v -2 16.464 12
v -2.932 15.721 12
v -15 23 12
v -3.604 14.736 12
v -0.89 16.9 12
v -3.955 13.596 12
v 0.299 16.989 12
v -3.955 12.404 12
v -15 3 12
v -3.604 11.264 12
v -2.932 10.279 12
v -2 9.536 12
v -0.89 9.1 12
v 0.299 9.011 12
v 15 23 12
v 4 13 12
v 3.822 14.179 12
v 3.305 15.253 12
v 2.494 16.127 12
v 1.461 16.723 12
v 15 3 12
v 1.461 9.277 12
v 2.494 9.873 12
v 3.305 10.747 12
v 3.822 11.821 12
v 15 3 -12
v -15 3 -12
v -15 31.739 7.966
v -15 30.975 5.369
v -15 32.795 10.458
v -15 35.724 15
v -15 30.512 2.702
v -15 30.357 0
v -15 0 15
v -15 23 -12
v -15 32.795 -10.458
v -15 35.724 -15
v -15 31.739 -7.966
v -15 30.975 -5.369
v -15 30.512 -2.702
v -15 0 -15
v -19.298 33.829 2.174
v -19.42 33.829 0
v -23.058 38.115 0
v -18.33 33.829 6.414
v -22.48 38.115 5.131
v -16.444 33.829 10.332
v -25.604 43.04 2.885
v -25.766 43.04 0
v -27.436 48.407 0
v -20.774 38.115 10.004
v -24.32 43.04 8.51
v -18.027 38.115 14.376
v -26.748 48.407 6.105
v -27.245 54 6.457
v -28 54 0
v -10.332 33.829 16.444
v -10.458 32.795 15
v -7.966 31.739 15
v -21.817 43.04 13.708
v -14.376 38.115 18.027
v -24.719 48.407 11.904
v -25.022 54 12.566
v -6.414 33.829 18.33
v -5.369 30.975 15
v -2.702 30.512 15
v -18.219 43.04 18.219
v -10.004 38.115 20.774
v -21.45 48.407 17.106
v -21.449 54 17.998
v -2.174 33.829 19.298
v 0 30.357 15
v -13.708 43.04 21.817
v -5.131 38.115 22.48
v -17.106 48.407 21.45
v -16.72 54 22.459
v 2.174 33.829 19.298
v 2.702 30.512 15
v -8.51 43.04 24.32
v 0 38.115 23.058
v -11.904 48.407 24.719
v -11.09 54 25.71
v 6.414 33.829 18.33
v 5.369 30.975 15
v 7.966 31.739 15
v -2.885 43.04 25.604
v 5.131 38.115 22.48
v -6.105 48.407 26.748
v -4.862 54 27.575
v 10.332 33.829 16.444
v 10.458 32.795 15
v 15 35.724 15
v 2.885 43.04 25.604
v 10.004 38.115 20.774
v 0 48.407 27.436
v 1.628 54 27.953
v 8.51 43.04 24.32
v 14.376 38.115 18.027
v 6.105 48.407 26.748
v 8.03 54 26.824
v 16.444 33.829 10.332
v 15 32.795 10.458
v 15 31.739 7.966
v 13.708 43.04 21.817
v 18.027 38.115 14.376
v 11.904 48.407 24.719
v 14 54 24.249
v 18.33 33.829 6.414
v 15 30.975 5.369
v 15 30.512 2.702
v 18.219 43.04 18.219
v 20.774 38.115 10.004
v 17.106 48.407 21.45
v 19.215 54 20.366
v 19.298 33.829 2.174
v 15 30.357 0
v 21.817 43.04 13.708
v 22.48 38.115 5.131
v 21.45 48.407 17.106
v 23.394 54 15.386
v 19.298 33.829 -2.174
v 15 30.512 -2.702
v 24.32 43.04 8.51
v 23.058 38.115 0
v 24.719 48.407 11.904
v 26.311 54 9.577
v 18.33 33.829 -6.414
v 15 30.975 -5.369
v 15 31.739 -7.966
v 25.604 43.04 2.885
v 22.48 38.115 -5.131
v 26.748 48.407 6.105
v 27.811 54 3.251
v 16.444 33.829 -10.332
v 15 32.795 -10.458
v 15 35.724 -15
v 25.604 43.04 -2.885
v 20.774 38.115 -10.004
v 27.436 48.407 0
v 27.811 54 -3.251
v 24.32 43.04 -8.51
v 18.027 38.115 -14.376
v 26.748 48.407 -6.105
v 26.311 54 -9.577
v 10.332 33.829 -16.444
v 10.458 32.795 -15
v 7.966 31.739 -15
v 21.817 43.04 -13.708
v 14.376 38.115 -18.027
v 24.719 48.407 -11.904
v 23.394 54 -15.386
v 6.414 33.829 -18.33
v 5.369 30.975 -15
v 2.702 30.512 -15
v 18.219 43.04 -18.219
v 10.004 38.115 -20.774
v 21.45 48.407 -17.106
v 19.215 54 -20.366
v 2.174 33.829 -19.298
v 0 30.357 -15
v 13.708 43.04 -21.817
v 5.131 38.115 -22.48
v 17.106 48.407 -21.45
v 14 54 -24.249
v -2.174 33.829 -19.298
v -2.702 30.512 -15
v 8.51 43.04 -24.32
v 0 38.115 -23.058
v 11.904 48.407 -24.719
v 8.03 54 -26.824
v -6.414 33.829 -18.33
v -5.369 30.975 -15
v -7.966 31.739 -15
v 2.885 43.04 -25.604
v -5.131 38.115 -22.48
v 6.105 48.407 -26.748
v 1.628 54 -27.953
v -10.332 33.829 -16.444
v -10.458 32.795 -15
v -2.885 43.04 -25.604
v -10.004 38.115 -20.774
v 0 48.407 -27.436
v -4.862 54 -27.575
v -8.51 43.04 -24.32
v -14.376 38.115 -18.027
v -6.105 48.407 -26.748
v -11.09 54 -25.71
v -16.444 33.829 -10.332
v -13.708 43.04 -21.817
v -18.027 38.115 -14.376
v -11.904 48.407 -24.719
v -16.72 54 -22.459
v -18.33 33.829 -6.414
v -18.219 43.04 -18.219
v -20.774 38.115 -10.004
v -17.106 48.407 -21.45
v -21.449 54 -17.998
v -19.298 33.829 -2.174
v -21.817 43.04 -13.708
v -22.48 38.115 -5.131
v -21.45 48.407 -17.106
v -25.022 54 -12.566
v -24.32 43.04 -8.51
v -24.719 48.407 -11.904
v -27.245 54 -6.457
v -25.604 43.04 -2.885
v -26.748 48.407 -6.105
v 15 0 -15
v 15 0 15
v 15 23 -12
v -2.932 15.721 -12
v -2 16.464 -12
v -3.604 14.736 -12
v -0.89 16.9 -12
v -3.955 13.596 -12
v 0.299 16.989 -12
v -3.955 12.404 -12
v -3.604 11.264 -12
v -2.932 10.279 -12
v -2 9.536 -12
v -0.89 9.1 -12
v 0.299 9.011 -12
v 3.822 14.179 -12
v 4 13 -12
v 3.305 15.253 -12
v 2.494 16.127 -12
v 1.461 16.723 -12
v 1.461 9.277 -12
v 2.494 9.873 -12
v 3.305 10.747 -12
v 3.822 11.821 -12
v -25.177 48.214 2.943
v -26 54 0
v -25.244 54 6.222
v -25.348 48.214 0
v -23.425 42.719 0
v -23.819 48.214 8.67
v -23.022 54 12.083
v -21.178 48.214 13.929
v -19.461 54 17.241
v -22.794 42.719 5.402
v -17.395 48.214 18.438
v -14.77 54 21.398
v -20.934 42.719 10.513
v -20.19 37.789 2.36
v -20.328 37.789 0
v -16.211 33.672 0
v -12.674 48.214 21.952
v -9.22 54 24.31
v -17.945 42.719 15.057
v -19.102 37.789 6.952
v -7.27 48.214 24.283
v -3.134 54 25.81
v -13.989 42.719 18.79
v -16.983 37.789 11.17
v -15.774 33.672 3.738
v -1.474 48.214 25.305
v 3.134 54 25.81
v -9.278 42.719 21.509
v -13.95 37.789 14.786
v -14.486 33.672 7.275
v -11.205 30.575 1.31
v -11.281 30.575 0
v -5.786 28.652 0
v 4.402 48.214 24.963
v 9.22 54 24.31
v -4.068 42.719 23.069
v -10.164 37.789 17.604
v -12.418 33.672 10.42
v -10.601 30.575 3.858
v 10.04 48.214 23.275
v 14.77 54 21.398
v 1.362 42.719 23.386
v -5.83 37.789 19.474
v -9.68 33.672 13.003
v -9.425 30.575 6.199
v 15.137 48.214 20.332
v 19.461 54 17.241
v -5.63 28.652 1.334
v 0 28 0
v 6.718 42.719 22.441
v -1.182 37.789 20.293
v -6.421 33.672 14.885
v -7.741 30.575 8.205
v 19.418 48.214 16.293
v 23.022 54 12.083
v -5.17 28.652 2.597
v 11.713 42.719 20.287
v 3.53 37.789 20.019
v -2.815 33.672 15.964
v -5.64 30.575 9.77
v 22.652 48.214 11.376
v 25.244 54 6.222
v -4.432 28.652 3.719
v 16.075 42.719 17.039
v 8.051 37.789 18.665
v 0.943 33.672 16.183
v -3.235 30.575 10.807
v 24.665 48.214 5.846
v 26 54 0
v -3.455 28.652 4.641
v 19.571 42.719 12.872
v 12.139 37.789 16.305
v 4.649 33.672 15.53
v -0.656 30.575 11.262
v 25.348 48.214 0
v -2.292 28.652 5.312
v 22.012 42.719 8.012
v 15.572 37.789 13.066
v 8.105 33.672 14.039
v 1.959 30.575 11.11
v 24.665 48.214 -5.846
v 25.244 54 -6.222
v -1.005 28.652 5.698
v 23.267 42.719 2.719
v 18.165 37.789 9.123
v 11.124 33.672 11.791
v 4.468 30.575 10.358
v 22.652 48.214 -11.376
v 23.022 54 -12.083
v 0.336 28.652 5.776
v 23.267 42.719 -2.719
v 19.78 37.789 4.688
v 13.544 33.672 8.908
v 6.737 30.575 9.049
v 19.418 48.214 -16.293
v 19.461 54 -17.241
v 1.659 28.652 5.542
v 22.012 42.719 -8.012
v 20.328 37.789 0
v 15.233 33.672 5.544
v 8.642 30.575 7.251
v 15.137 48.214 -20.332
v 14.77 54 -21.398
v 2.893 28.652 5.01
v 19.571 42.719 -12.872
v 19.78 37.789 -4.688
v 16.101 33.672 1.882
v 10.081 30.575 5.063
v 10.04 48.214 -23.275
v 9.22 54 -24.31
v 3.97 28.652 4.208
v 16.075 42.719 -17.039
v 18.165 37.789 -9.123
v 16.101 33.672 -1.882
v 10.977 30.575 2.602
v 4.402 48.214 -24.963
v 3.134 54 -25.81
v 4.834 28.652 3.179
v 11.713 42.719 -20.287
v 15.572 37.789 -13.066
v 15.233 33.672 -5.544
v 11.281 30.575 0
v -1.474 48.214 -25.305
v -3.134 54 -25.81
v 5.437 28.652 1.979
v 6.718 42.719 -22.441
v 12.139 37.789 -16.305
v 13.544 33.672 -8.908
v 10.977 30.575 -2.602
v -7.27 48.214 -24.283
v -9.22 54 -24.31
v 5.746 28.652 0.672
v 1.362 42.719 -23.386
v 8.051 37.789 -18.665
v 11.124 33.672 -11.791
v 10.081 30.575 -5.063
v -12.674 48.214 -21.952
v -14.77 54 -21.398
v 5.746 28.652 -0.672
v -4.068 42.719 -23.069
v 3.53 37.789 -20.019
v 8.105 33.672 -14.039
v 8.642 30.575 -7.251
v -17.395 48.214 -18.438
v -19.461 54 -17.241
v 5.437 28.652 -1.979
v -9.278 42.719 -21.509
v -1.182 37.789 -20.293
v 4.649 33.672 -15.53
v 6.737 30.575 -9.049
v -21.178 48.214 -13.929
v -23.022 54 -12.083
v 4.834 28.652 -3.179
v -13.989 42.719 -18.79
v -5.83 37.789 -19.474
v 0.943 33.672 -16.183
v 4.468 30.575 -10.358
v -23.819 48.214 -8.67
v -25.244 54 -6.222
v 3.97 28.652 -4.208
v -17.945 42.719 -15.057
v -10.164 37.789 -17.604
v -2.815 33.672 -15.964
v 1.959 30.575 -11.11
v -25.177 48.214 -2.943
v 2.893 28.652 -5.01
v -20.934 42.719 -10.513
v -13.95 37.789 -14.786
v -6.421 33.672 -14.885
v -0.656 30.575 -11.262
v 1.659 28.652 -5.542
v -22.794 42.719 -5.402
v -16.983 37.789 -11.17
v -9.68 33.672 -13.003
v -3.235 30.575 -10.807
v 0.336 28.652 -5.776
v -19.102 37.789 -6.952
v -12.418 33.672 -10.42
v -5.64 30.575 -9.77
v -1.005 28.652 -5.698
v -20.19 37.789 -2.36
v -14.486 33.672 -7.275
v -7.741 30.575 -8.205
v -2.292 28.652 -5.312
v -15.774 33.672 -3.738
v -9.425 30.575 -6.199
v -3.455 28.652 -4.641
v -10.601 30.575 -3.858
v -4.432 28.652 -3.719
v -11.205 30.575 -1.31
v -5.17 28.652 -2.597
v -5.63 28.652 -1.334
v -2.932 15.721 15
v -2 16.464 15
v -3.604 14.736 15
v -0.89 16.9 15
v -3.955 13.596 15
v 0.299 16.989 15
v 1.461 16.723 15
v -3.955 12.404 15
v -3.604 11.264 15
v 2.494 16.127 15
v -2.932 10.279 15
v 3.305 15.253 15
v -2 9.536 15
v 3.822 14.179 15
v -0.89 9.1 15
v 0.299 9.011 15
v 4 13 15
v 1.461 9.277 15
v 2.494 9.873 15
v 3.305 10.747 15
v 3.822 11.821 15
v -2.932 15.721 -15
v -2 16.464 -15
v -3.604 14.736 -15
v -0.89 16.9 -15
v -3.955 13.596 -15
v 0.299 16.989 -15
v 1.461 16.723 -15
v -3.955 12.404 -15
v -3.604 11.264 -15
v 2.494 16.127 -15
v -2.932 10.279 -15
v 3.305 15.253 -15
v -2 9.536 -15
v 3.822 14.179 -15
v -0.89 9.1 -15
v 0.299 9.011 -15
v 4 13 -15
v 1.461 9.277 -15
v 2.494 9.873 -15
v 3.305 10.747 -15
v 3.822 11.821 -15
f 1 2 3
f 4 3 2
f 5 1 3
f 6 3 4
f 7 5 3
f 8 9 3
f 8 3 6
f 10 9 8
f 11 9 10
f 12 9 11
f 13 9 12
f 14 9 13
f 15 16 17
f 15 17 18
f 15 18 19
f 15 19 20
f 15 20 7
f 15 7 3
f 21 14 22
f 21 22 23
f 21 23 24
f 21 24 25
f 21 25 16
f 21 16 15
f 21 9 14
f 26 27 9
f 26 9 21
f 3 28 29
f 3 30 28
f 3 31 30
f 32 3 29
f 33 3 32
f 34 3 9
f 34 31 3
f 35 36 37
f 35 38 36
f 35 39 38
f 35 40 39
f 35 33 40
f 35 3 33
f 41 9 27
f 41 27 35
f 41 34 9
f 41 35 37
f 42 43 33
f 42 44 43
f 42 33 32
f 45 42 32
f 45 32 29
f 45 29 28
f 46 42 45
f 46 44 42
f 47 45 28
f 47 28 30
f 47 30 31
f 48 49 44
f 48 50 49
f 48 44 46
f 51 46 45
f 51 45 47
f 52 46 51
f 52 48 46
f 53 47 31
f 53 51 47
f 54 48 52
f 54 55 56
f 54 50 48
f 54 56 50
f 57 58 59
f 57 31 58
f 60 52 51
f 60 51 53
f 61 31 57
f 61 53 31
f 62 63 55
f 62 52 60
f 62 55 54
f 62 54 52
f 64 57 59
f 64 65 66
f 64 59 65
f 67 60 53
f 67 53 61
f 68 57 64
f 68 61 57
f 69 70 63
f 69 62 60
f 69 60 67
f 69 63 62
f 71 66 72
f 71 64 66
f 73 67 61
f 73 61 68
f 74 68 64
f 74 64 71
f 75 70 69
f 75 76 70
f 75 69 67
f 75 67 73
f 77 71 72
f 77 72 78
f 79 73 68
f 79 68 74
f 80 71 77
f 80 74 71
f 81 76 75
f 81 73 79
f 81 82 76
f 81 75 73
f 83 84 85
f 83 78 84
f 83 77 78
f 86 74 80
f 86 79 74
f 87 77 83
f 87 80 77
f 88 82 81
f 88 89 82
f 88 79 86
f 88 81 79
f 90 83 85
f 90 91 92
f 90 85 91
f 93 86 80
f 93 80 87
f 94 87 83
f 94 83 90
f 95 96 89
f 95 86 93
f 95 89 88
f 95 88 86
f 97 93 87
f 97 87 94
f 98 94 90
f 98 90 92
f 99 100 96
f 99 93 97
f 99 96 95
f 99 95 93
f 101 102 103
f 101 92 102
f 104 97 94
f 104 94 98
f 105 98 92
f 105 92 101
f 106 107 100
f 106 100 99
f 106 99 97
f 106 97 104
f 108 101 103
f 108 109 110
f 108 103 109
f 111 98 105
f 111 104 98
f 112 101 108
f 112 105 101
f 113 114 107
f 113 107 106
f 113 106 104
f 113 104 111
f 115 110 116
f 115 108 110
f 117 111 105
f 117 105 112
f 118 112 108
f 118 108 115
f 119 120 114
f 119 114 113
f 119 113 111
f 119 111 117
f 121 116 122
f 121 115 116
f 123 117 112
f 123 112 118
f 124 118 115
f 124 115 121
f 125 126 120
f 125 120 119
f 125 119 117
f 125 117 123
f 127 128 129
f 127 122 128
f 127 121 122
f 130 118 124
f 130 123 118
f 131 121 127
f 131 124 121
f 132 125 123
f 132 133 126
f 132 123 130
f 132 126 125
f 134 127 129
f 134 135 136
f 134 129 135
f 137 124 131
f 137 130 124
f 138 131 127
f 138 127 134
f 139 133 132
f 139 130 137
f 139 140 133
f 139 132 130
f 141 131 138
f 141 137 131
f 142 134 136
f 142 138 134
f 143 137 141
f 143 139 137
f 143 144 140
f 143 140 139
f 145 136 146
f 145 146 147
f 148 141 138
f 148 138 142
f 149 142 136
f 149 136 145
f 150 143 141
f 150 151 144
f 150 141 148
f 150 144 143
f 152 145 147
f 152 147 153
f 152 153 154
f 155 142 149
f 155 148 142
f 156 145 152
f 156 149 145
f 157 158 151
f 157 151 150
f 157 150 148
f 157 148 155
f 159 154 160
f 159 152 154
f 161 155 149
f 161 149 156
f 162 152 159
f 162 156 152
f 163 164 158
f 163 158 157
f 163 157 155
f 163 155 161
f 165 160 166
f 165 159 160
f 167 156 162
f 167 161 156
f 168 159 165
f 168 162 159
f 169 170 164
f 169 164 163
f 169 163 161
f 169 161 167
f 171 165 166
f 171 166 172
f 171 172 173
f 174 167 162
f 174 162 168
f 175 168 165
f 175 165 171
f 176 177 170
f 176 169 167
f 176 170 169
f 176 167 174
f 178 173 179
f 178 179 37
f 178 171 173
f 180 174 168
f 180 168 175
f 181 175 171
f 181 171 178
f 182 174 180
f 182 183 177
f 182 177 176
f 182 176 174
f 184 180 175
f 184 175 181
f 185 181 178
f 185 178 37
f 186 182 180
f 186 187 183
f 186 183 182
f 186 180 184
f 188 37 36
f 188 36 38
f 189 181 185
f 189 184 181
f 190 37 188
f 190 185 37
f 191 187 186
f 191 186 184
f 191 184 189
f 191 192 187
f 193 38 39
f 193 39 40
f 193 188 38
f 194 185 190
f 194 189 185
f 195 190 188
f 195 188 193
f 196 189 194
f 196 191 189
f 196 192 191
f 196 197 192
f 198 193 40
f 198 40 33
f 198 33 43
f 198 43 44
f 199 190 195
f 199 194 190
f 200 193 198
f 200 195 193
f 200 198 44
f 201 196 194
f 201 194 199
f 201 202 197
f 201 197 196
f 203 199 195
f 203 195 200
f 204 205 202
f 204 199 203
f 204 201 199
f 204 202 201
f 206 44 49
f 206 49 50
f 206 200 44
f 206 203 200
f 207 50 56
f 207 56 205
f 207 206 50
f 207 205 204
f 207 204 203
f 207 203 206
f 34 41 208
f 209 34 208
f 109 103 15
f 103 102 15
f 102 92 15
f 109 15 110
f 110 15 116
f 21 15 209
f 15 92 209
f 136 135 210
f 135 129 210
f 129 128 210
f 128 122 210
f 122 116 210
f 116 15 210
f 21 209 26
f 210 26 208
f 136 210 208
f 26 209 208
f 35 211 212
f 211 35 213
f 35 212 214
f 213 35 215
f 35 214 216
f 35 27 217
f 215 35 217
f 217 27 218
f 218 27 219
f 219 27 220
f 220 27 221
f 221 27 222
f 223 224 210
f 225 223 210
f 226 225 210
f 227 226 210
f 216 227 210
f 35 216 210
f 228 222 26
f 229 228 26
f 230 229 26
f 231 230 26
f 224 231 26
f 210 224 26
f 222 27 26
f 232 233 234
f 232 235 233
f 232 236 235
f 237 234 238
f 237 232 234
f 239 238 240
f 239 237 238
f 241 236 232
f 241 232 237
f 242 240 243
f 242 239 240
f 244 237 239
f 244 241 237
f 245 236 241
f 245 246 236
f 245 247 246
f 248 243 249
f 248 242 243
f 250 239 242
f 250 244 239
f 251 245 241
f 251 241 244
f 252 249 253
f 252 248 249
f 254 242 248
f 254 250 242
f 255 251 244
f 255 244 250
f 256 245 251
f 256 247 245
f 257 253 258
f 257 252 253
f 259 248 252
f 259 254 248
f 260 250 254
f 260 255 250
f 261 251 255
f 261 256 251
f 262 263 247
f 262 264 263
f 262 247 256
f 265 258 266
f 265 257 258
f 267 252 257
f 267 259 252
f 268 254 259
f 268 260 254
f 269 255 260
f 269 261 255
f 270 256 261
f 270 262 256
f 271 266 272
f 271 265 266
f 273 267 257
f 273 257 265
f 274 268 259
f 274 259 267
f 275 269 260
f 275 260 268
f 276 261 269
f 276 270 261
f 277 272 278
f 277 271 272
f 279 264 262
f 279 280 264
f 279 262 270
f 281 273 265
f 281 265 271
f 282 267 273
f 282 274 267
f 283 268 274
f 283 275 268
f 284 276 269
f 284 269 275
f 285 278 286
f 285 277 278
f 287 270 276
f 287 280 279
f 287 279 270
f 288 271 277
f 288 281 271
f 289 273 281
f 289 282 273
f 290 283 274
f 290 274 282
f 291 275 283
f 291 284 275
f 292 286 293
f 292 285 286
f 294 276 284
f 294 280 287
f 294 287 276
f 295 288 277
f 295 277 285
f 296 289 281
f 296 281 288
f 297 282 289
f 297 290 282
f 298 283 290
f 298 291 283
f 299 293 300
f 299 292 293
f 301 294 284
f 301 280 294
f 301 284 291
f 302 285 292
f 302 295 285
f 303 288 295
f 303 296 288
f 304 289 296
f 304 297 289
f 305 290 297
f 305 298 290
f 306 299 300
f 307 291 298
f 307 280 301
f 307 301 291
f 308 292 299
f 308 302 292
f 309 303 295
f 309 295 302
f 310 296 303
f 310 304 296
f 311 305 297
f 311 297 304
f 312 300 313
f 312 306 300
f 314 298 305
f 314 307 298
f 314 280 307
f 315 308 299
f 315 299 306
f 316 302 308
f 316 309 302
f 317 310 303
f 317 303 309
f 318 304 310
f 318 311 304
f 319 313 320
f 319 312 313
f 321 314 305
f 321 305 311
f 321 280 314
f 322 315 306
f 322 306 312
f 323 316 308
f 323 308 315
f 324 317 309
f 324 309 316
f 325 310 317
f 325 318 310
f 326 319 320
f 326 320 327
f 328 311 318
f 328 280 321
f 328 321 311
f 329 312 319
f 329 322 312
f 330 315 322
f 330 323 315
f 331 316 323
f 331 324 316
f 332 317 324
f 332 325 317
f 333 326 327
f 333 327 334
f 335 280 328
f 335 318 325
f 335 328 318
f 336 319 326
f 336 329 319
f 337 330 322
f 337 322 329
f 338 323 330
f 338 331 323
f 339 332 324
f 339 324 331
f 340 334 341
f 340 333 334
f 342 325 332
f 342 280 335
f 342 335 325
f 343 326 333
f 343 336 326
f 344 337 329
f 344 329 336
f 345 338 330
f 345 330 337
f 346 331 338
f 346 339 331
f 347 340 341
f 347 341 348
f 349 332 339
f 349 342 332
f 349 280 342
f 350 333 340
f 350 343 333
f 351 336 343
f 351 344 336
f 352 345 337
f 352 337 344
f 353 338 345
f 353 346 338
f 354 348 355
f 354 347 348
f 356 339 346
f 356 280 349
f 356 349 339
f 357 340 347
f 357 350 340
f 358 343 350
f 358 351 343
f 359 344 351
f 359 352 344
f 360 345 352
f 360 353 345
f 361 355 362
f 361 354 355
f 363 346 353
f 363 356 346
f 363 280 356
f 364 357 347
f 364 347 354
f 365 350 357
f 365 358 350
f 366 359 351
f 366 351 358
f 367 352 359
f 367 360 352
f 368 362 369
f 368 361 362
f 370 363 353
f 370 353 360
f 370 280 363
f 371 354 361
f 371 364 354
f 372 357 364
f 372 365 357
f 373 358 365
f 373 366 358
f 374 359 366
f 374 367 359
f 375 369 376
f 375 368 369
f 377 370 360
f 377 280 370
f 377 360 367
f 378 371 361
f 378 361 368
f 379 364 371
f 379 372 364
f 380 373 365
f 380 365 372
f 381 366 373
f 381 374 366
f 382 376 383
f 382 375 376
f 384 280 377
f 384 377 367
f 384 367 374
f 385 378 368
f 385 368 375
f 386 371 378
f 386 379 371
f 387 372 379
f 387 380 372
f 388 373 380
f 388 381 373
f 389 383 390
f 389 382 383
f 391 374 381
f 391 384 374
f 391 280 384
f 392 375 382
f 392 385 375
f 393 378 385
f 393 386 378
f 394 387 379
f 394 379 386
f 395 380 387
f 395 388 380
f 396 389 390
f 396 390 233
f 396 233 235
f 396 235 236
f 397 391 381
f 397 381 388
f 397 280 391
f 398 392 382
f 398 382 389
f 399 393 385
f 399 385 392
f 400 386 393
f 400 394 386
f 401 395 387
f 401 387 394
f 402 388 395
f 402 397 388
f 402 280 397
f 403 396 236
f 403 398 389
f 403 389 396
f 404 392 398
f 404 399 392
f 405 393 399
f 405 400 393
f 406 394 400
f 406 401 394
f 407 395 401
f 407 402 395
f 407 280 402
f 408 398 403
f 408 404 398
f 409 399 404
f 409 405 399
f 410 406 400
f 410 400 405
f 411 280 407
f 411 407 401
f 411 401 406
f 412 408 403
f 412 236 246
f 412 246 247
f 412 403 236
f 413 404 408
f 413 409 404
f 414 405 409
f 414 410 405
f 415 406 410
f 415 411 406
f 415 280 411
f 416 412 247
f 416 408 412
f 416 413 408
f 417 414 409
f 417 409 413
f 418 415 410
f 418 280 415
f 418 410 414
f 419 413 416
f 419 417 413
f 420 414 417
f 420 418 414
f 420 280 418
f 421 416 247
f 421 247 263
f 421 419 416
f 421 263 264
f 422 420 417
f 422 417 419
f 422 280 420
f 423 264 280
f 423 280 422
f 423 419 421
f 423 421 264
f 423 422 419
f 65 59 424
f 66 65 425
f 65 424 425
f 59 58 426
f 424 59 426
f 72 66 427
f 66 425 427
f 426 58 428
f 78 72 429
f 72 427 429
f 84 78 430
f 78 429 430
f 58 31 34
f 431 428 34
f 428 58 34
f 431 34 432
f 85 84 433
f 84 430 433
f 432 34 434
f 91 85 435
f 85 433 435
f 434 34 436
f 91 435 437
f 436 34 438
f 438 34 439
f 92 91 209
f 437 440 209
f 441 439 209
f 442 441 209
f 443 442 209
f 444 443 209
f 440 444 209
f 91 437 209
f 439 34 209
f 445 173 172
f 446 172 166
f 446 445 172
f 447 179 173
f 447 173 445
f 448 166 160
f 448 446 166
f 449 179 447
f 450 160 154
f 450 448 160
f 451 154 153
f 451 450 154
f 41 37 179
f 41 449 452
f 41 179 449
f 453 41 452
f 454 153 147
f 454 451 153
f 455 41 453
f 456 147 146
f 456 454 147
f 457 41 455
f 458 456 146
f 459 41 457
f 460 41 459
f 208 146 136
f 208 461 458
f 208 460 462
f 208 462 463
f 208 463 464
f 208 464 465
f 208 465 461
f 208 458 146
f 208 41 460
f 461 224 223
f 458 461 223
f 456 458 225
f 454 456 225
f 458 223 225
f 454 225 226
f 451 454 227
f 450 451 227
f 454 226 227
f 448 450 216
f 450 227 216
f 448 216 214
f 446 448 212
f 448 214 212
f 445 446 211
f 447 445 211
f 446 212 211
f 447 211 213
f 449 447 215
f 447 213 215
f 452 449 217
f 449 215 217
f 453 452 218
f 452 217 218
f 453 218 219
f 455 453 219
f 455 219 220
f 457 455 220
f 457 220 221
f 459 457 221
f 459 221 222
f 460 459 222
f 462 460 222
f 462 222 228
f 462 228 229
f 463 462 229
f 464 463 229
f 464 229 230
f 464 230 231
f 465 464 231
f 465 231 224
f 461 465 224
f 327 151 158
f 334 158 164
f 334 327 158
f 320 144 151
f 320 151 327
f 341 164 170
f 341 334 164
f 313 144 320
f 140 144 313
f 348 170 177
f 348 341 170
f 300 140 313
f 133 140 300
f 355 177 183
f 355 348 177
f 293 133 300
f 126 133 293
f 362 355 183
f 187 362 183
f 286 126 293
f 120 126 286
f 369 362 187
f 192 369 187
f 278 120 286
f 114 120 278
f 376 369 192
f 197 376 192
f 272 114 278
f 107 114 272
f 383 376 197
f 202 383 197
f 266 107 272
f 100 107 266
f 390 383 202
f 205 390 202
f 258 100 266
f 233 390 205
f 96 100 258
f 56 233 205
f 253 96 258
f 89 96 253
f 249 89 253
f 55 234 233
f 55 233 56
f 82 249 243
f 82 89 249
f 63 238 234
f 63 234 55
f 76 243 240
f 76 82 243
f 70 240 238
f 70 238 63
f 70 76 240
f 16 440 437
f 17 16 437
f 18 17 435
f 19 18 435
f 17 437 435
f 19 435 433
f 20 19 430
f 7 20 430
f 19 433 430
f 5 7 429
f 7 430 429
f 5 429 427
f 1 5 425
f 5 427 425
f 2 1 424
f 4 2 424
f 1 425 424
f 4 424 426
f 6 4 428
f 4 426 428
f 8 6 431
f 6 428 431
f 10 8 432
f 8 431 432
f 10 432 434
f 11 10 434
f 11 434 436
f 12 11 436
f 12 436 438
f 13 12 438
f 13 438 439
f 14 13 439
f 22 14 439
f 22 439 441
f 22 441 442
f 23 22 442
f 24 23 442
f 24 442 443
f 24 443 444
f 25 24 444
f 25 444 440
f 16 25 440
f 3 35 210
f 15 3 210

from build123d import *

# Parameters (mm, degrees)
SKETCH1_W           = 30
SKETCH1_H           = 30
BOSS_EXTRUDE1_DEPTH = 26
SHELL1_T            = -3
SKETCH3_R           = 4
CUT_EXTRUDE1_DEPTH  = 43.438190348
BOSS_EXTRUDE2_REACH = 50.497
SKETCH6_W           = 30
SKETCH6_H           = 30


with BuildPart() as part:
    # Sketch1 → Boss-Extrude1 (new body)
    with BuildSketch(Plane(origin=(0, 0, 0), x_dir=(1, 0, 0), z_dir=(0, 1, 0))):
        Rectangle(SKETCH1_W, SKETCH1_H)
    extrude(amount=BOSS_EXTRUDE1_DEPTH)

    # Shell1
    shell1_openings = [part.faces().sort_by_distance(p)[0] for p in [
        (-15, 13, 0),
        (15, 13, 0),
    ]]
    offset(amount=SHELL1_T, openings=shell1_openings, kind=Kind.INTERSECTION)

    # Sketch3 → Cut-Extrude1 (cut, through all)
    with BuildSketch(Plane.XY.offset(15)):
        with Locations((0, 13)):
            Circle(SKETCH3_R)
    extrude(amount=-CUT_EXTRUDE1_DEPTH, mode=Mode.SUBTRACT)


with BuildPart() as body_2:
    # Sketch5 → Revolve1 (revolve)
    with BuildSketch(Plane.XY):
        with BuildLine():
            Line((-28, 54), (-26, 54))
            ThreePointArc((-26, 54), (-18.384776311, 35.615223689), (0, 28))
            Line((0, 28), (0, 26))
            ThreePointArc((0, 26), (-19.798989873, 34.201010127), (-28, 54))
        make_face()
    revolve(axis=Axis((0, 26, 0), (0, 1, 0)))

    # Sketch6 → Boss-Extrude2 (add, up to next)
    with BuildSketch(Plane(origin=(0, 26, 0), x_dir=(1, 0, 0), z_dir=(0, 1, 0)), mode=Mode.PRIVATE) as boss_extrude2_sk1:
        Rectangle(SKETCH6_W, SKETCH6_H)
    boss_extrude2_tool1 = extrude(boss_extrude2_sk1.sketch, amount=BOSS_EXTRUDE2_REACH, mode=Mode.PRIVATE) - body_2.part

    add(part.part)  # Boss-Extrude2 merges part
    add(boss_extrude2_tool1.solids().sort_by_distance((0, 26, 0))[0])


solid = body_2.part
